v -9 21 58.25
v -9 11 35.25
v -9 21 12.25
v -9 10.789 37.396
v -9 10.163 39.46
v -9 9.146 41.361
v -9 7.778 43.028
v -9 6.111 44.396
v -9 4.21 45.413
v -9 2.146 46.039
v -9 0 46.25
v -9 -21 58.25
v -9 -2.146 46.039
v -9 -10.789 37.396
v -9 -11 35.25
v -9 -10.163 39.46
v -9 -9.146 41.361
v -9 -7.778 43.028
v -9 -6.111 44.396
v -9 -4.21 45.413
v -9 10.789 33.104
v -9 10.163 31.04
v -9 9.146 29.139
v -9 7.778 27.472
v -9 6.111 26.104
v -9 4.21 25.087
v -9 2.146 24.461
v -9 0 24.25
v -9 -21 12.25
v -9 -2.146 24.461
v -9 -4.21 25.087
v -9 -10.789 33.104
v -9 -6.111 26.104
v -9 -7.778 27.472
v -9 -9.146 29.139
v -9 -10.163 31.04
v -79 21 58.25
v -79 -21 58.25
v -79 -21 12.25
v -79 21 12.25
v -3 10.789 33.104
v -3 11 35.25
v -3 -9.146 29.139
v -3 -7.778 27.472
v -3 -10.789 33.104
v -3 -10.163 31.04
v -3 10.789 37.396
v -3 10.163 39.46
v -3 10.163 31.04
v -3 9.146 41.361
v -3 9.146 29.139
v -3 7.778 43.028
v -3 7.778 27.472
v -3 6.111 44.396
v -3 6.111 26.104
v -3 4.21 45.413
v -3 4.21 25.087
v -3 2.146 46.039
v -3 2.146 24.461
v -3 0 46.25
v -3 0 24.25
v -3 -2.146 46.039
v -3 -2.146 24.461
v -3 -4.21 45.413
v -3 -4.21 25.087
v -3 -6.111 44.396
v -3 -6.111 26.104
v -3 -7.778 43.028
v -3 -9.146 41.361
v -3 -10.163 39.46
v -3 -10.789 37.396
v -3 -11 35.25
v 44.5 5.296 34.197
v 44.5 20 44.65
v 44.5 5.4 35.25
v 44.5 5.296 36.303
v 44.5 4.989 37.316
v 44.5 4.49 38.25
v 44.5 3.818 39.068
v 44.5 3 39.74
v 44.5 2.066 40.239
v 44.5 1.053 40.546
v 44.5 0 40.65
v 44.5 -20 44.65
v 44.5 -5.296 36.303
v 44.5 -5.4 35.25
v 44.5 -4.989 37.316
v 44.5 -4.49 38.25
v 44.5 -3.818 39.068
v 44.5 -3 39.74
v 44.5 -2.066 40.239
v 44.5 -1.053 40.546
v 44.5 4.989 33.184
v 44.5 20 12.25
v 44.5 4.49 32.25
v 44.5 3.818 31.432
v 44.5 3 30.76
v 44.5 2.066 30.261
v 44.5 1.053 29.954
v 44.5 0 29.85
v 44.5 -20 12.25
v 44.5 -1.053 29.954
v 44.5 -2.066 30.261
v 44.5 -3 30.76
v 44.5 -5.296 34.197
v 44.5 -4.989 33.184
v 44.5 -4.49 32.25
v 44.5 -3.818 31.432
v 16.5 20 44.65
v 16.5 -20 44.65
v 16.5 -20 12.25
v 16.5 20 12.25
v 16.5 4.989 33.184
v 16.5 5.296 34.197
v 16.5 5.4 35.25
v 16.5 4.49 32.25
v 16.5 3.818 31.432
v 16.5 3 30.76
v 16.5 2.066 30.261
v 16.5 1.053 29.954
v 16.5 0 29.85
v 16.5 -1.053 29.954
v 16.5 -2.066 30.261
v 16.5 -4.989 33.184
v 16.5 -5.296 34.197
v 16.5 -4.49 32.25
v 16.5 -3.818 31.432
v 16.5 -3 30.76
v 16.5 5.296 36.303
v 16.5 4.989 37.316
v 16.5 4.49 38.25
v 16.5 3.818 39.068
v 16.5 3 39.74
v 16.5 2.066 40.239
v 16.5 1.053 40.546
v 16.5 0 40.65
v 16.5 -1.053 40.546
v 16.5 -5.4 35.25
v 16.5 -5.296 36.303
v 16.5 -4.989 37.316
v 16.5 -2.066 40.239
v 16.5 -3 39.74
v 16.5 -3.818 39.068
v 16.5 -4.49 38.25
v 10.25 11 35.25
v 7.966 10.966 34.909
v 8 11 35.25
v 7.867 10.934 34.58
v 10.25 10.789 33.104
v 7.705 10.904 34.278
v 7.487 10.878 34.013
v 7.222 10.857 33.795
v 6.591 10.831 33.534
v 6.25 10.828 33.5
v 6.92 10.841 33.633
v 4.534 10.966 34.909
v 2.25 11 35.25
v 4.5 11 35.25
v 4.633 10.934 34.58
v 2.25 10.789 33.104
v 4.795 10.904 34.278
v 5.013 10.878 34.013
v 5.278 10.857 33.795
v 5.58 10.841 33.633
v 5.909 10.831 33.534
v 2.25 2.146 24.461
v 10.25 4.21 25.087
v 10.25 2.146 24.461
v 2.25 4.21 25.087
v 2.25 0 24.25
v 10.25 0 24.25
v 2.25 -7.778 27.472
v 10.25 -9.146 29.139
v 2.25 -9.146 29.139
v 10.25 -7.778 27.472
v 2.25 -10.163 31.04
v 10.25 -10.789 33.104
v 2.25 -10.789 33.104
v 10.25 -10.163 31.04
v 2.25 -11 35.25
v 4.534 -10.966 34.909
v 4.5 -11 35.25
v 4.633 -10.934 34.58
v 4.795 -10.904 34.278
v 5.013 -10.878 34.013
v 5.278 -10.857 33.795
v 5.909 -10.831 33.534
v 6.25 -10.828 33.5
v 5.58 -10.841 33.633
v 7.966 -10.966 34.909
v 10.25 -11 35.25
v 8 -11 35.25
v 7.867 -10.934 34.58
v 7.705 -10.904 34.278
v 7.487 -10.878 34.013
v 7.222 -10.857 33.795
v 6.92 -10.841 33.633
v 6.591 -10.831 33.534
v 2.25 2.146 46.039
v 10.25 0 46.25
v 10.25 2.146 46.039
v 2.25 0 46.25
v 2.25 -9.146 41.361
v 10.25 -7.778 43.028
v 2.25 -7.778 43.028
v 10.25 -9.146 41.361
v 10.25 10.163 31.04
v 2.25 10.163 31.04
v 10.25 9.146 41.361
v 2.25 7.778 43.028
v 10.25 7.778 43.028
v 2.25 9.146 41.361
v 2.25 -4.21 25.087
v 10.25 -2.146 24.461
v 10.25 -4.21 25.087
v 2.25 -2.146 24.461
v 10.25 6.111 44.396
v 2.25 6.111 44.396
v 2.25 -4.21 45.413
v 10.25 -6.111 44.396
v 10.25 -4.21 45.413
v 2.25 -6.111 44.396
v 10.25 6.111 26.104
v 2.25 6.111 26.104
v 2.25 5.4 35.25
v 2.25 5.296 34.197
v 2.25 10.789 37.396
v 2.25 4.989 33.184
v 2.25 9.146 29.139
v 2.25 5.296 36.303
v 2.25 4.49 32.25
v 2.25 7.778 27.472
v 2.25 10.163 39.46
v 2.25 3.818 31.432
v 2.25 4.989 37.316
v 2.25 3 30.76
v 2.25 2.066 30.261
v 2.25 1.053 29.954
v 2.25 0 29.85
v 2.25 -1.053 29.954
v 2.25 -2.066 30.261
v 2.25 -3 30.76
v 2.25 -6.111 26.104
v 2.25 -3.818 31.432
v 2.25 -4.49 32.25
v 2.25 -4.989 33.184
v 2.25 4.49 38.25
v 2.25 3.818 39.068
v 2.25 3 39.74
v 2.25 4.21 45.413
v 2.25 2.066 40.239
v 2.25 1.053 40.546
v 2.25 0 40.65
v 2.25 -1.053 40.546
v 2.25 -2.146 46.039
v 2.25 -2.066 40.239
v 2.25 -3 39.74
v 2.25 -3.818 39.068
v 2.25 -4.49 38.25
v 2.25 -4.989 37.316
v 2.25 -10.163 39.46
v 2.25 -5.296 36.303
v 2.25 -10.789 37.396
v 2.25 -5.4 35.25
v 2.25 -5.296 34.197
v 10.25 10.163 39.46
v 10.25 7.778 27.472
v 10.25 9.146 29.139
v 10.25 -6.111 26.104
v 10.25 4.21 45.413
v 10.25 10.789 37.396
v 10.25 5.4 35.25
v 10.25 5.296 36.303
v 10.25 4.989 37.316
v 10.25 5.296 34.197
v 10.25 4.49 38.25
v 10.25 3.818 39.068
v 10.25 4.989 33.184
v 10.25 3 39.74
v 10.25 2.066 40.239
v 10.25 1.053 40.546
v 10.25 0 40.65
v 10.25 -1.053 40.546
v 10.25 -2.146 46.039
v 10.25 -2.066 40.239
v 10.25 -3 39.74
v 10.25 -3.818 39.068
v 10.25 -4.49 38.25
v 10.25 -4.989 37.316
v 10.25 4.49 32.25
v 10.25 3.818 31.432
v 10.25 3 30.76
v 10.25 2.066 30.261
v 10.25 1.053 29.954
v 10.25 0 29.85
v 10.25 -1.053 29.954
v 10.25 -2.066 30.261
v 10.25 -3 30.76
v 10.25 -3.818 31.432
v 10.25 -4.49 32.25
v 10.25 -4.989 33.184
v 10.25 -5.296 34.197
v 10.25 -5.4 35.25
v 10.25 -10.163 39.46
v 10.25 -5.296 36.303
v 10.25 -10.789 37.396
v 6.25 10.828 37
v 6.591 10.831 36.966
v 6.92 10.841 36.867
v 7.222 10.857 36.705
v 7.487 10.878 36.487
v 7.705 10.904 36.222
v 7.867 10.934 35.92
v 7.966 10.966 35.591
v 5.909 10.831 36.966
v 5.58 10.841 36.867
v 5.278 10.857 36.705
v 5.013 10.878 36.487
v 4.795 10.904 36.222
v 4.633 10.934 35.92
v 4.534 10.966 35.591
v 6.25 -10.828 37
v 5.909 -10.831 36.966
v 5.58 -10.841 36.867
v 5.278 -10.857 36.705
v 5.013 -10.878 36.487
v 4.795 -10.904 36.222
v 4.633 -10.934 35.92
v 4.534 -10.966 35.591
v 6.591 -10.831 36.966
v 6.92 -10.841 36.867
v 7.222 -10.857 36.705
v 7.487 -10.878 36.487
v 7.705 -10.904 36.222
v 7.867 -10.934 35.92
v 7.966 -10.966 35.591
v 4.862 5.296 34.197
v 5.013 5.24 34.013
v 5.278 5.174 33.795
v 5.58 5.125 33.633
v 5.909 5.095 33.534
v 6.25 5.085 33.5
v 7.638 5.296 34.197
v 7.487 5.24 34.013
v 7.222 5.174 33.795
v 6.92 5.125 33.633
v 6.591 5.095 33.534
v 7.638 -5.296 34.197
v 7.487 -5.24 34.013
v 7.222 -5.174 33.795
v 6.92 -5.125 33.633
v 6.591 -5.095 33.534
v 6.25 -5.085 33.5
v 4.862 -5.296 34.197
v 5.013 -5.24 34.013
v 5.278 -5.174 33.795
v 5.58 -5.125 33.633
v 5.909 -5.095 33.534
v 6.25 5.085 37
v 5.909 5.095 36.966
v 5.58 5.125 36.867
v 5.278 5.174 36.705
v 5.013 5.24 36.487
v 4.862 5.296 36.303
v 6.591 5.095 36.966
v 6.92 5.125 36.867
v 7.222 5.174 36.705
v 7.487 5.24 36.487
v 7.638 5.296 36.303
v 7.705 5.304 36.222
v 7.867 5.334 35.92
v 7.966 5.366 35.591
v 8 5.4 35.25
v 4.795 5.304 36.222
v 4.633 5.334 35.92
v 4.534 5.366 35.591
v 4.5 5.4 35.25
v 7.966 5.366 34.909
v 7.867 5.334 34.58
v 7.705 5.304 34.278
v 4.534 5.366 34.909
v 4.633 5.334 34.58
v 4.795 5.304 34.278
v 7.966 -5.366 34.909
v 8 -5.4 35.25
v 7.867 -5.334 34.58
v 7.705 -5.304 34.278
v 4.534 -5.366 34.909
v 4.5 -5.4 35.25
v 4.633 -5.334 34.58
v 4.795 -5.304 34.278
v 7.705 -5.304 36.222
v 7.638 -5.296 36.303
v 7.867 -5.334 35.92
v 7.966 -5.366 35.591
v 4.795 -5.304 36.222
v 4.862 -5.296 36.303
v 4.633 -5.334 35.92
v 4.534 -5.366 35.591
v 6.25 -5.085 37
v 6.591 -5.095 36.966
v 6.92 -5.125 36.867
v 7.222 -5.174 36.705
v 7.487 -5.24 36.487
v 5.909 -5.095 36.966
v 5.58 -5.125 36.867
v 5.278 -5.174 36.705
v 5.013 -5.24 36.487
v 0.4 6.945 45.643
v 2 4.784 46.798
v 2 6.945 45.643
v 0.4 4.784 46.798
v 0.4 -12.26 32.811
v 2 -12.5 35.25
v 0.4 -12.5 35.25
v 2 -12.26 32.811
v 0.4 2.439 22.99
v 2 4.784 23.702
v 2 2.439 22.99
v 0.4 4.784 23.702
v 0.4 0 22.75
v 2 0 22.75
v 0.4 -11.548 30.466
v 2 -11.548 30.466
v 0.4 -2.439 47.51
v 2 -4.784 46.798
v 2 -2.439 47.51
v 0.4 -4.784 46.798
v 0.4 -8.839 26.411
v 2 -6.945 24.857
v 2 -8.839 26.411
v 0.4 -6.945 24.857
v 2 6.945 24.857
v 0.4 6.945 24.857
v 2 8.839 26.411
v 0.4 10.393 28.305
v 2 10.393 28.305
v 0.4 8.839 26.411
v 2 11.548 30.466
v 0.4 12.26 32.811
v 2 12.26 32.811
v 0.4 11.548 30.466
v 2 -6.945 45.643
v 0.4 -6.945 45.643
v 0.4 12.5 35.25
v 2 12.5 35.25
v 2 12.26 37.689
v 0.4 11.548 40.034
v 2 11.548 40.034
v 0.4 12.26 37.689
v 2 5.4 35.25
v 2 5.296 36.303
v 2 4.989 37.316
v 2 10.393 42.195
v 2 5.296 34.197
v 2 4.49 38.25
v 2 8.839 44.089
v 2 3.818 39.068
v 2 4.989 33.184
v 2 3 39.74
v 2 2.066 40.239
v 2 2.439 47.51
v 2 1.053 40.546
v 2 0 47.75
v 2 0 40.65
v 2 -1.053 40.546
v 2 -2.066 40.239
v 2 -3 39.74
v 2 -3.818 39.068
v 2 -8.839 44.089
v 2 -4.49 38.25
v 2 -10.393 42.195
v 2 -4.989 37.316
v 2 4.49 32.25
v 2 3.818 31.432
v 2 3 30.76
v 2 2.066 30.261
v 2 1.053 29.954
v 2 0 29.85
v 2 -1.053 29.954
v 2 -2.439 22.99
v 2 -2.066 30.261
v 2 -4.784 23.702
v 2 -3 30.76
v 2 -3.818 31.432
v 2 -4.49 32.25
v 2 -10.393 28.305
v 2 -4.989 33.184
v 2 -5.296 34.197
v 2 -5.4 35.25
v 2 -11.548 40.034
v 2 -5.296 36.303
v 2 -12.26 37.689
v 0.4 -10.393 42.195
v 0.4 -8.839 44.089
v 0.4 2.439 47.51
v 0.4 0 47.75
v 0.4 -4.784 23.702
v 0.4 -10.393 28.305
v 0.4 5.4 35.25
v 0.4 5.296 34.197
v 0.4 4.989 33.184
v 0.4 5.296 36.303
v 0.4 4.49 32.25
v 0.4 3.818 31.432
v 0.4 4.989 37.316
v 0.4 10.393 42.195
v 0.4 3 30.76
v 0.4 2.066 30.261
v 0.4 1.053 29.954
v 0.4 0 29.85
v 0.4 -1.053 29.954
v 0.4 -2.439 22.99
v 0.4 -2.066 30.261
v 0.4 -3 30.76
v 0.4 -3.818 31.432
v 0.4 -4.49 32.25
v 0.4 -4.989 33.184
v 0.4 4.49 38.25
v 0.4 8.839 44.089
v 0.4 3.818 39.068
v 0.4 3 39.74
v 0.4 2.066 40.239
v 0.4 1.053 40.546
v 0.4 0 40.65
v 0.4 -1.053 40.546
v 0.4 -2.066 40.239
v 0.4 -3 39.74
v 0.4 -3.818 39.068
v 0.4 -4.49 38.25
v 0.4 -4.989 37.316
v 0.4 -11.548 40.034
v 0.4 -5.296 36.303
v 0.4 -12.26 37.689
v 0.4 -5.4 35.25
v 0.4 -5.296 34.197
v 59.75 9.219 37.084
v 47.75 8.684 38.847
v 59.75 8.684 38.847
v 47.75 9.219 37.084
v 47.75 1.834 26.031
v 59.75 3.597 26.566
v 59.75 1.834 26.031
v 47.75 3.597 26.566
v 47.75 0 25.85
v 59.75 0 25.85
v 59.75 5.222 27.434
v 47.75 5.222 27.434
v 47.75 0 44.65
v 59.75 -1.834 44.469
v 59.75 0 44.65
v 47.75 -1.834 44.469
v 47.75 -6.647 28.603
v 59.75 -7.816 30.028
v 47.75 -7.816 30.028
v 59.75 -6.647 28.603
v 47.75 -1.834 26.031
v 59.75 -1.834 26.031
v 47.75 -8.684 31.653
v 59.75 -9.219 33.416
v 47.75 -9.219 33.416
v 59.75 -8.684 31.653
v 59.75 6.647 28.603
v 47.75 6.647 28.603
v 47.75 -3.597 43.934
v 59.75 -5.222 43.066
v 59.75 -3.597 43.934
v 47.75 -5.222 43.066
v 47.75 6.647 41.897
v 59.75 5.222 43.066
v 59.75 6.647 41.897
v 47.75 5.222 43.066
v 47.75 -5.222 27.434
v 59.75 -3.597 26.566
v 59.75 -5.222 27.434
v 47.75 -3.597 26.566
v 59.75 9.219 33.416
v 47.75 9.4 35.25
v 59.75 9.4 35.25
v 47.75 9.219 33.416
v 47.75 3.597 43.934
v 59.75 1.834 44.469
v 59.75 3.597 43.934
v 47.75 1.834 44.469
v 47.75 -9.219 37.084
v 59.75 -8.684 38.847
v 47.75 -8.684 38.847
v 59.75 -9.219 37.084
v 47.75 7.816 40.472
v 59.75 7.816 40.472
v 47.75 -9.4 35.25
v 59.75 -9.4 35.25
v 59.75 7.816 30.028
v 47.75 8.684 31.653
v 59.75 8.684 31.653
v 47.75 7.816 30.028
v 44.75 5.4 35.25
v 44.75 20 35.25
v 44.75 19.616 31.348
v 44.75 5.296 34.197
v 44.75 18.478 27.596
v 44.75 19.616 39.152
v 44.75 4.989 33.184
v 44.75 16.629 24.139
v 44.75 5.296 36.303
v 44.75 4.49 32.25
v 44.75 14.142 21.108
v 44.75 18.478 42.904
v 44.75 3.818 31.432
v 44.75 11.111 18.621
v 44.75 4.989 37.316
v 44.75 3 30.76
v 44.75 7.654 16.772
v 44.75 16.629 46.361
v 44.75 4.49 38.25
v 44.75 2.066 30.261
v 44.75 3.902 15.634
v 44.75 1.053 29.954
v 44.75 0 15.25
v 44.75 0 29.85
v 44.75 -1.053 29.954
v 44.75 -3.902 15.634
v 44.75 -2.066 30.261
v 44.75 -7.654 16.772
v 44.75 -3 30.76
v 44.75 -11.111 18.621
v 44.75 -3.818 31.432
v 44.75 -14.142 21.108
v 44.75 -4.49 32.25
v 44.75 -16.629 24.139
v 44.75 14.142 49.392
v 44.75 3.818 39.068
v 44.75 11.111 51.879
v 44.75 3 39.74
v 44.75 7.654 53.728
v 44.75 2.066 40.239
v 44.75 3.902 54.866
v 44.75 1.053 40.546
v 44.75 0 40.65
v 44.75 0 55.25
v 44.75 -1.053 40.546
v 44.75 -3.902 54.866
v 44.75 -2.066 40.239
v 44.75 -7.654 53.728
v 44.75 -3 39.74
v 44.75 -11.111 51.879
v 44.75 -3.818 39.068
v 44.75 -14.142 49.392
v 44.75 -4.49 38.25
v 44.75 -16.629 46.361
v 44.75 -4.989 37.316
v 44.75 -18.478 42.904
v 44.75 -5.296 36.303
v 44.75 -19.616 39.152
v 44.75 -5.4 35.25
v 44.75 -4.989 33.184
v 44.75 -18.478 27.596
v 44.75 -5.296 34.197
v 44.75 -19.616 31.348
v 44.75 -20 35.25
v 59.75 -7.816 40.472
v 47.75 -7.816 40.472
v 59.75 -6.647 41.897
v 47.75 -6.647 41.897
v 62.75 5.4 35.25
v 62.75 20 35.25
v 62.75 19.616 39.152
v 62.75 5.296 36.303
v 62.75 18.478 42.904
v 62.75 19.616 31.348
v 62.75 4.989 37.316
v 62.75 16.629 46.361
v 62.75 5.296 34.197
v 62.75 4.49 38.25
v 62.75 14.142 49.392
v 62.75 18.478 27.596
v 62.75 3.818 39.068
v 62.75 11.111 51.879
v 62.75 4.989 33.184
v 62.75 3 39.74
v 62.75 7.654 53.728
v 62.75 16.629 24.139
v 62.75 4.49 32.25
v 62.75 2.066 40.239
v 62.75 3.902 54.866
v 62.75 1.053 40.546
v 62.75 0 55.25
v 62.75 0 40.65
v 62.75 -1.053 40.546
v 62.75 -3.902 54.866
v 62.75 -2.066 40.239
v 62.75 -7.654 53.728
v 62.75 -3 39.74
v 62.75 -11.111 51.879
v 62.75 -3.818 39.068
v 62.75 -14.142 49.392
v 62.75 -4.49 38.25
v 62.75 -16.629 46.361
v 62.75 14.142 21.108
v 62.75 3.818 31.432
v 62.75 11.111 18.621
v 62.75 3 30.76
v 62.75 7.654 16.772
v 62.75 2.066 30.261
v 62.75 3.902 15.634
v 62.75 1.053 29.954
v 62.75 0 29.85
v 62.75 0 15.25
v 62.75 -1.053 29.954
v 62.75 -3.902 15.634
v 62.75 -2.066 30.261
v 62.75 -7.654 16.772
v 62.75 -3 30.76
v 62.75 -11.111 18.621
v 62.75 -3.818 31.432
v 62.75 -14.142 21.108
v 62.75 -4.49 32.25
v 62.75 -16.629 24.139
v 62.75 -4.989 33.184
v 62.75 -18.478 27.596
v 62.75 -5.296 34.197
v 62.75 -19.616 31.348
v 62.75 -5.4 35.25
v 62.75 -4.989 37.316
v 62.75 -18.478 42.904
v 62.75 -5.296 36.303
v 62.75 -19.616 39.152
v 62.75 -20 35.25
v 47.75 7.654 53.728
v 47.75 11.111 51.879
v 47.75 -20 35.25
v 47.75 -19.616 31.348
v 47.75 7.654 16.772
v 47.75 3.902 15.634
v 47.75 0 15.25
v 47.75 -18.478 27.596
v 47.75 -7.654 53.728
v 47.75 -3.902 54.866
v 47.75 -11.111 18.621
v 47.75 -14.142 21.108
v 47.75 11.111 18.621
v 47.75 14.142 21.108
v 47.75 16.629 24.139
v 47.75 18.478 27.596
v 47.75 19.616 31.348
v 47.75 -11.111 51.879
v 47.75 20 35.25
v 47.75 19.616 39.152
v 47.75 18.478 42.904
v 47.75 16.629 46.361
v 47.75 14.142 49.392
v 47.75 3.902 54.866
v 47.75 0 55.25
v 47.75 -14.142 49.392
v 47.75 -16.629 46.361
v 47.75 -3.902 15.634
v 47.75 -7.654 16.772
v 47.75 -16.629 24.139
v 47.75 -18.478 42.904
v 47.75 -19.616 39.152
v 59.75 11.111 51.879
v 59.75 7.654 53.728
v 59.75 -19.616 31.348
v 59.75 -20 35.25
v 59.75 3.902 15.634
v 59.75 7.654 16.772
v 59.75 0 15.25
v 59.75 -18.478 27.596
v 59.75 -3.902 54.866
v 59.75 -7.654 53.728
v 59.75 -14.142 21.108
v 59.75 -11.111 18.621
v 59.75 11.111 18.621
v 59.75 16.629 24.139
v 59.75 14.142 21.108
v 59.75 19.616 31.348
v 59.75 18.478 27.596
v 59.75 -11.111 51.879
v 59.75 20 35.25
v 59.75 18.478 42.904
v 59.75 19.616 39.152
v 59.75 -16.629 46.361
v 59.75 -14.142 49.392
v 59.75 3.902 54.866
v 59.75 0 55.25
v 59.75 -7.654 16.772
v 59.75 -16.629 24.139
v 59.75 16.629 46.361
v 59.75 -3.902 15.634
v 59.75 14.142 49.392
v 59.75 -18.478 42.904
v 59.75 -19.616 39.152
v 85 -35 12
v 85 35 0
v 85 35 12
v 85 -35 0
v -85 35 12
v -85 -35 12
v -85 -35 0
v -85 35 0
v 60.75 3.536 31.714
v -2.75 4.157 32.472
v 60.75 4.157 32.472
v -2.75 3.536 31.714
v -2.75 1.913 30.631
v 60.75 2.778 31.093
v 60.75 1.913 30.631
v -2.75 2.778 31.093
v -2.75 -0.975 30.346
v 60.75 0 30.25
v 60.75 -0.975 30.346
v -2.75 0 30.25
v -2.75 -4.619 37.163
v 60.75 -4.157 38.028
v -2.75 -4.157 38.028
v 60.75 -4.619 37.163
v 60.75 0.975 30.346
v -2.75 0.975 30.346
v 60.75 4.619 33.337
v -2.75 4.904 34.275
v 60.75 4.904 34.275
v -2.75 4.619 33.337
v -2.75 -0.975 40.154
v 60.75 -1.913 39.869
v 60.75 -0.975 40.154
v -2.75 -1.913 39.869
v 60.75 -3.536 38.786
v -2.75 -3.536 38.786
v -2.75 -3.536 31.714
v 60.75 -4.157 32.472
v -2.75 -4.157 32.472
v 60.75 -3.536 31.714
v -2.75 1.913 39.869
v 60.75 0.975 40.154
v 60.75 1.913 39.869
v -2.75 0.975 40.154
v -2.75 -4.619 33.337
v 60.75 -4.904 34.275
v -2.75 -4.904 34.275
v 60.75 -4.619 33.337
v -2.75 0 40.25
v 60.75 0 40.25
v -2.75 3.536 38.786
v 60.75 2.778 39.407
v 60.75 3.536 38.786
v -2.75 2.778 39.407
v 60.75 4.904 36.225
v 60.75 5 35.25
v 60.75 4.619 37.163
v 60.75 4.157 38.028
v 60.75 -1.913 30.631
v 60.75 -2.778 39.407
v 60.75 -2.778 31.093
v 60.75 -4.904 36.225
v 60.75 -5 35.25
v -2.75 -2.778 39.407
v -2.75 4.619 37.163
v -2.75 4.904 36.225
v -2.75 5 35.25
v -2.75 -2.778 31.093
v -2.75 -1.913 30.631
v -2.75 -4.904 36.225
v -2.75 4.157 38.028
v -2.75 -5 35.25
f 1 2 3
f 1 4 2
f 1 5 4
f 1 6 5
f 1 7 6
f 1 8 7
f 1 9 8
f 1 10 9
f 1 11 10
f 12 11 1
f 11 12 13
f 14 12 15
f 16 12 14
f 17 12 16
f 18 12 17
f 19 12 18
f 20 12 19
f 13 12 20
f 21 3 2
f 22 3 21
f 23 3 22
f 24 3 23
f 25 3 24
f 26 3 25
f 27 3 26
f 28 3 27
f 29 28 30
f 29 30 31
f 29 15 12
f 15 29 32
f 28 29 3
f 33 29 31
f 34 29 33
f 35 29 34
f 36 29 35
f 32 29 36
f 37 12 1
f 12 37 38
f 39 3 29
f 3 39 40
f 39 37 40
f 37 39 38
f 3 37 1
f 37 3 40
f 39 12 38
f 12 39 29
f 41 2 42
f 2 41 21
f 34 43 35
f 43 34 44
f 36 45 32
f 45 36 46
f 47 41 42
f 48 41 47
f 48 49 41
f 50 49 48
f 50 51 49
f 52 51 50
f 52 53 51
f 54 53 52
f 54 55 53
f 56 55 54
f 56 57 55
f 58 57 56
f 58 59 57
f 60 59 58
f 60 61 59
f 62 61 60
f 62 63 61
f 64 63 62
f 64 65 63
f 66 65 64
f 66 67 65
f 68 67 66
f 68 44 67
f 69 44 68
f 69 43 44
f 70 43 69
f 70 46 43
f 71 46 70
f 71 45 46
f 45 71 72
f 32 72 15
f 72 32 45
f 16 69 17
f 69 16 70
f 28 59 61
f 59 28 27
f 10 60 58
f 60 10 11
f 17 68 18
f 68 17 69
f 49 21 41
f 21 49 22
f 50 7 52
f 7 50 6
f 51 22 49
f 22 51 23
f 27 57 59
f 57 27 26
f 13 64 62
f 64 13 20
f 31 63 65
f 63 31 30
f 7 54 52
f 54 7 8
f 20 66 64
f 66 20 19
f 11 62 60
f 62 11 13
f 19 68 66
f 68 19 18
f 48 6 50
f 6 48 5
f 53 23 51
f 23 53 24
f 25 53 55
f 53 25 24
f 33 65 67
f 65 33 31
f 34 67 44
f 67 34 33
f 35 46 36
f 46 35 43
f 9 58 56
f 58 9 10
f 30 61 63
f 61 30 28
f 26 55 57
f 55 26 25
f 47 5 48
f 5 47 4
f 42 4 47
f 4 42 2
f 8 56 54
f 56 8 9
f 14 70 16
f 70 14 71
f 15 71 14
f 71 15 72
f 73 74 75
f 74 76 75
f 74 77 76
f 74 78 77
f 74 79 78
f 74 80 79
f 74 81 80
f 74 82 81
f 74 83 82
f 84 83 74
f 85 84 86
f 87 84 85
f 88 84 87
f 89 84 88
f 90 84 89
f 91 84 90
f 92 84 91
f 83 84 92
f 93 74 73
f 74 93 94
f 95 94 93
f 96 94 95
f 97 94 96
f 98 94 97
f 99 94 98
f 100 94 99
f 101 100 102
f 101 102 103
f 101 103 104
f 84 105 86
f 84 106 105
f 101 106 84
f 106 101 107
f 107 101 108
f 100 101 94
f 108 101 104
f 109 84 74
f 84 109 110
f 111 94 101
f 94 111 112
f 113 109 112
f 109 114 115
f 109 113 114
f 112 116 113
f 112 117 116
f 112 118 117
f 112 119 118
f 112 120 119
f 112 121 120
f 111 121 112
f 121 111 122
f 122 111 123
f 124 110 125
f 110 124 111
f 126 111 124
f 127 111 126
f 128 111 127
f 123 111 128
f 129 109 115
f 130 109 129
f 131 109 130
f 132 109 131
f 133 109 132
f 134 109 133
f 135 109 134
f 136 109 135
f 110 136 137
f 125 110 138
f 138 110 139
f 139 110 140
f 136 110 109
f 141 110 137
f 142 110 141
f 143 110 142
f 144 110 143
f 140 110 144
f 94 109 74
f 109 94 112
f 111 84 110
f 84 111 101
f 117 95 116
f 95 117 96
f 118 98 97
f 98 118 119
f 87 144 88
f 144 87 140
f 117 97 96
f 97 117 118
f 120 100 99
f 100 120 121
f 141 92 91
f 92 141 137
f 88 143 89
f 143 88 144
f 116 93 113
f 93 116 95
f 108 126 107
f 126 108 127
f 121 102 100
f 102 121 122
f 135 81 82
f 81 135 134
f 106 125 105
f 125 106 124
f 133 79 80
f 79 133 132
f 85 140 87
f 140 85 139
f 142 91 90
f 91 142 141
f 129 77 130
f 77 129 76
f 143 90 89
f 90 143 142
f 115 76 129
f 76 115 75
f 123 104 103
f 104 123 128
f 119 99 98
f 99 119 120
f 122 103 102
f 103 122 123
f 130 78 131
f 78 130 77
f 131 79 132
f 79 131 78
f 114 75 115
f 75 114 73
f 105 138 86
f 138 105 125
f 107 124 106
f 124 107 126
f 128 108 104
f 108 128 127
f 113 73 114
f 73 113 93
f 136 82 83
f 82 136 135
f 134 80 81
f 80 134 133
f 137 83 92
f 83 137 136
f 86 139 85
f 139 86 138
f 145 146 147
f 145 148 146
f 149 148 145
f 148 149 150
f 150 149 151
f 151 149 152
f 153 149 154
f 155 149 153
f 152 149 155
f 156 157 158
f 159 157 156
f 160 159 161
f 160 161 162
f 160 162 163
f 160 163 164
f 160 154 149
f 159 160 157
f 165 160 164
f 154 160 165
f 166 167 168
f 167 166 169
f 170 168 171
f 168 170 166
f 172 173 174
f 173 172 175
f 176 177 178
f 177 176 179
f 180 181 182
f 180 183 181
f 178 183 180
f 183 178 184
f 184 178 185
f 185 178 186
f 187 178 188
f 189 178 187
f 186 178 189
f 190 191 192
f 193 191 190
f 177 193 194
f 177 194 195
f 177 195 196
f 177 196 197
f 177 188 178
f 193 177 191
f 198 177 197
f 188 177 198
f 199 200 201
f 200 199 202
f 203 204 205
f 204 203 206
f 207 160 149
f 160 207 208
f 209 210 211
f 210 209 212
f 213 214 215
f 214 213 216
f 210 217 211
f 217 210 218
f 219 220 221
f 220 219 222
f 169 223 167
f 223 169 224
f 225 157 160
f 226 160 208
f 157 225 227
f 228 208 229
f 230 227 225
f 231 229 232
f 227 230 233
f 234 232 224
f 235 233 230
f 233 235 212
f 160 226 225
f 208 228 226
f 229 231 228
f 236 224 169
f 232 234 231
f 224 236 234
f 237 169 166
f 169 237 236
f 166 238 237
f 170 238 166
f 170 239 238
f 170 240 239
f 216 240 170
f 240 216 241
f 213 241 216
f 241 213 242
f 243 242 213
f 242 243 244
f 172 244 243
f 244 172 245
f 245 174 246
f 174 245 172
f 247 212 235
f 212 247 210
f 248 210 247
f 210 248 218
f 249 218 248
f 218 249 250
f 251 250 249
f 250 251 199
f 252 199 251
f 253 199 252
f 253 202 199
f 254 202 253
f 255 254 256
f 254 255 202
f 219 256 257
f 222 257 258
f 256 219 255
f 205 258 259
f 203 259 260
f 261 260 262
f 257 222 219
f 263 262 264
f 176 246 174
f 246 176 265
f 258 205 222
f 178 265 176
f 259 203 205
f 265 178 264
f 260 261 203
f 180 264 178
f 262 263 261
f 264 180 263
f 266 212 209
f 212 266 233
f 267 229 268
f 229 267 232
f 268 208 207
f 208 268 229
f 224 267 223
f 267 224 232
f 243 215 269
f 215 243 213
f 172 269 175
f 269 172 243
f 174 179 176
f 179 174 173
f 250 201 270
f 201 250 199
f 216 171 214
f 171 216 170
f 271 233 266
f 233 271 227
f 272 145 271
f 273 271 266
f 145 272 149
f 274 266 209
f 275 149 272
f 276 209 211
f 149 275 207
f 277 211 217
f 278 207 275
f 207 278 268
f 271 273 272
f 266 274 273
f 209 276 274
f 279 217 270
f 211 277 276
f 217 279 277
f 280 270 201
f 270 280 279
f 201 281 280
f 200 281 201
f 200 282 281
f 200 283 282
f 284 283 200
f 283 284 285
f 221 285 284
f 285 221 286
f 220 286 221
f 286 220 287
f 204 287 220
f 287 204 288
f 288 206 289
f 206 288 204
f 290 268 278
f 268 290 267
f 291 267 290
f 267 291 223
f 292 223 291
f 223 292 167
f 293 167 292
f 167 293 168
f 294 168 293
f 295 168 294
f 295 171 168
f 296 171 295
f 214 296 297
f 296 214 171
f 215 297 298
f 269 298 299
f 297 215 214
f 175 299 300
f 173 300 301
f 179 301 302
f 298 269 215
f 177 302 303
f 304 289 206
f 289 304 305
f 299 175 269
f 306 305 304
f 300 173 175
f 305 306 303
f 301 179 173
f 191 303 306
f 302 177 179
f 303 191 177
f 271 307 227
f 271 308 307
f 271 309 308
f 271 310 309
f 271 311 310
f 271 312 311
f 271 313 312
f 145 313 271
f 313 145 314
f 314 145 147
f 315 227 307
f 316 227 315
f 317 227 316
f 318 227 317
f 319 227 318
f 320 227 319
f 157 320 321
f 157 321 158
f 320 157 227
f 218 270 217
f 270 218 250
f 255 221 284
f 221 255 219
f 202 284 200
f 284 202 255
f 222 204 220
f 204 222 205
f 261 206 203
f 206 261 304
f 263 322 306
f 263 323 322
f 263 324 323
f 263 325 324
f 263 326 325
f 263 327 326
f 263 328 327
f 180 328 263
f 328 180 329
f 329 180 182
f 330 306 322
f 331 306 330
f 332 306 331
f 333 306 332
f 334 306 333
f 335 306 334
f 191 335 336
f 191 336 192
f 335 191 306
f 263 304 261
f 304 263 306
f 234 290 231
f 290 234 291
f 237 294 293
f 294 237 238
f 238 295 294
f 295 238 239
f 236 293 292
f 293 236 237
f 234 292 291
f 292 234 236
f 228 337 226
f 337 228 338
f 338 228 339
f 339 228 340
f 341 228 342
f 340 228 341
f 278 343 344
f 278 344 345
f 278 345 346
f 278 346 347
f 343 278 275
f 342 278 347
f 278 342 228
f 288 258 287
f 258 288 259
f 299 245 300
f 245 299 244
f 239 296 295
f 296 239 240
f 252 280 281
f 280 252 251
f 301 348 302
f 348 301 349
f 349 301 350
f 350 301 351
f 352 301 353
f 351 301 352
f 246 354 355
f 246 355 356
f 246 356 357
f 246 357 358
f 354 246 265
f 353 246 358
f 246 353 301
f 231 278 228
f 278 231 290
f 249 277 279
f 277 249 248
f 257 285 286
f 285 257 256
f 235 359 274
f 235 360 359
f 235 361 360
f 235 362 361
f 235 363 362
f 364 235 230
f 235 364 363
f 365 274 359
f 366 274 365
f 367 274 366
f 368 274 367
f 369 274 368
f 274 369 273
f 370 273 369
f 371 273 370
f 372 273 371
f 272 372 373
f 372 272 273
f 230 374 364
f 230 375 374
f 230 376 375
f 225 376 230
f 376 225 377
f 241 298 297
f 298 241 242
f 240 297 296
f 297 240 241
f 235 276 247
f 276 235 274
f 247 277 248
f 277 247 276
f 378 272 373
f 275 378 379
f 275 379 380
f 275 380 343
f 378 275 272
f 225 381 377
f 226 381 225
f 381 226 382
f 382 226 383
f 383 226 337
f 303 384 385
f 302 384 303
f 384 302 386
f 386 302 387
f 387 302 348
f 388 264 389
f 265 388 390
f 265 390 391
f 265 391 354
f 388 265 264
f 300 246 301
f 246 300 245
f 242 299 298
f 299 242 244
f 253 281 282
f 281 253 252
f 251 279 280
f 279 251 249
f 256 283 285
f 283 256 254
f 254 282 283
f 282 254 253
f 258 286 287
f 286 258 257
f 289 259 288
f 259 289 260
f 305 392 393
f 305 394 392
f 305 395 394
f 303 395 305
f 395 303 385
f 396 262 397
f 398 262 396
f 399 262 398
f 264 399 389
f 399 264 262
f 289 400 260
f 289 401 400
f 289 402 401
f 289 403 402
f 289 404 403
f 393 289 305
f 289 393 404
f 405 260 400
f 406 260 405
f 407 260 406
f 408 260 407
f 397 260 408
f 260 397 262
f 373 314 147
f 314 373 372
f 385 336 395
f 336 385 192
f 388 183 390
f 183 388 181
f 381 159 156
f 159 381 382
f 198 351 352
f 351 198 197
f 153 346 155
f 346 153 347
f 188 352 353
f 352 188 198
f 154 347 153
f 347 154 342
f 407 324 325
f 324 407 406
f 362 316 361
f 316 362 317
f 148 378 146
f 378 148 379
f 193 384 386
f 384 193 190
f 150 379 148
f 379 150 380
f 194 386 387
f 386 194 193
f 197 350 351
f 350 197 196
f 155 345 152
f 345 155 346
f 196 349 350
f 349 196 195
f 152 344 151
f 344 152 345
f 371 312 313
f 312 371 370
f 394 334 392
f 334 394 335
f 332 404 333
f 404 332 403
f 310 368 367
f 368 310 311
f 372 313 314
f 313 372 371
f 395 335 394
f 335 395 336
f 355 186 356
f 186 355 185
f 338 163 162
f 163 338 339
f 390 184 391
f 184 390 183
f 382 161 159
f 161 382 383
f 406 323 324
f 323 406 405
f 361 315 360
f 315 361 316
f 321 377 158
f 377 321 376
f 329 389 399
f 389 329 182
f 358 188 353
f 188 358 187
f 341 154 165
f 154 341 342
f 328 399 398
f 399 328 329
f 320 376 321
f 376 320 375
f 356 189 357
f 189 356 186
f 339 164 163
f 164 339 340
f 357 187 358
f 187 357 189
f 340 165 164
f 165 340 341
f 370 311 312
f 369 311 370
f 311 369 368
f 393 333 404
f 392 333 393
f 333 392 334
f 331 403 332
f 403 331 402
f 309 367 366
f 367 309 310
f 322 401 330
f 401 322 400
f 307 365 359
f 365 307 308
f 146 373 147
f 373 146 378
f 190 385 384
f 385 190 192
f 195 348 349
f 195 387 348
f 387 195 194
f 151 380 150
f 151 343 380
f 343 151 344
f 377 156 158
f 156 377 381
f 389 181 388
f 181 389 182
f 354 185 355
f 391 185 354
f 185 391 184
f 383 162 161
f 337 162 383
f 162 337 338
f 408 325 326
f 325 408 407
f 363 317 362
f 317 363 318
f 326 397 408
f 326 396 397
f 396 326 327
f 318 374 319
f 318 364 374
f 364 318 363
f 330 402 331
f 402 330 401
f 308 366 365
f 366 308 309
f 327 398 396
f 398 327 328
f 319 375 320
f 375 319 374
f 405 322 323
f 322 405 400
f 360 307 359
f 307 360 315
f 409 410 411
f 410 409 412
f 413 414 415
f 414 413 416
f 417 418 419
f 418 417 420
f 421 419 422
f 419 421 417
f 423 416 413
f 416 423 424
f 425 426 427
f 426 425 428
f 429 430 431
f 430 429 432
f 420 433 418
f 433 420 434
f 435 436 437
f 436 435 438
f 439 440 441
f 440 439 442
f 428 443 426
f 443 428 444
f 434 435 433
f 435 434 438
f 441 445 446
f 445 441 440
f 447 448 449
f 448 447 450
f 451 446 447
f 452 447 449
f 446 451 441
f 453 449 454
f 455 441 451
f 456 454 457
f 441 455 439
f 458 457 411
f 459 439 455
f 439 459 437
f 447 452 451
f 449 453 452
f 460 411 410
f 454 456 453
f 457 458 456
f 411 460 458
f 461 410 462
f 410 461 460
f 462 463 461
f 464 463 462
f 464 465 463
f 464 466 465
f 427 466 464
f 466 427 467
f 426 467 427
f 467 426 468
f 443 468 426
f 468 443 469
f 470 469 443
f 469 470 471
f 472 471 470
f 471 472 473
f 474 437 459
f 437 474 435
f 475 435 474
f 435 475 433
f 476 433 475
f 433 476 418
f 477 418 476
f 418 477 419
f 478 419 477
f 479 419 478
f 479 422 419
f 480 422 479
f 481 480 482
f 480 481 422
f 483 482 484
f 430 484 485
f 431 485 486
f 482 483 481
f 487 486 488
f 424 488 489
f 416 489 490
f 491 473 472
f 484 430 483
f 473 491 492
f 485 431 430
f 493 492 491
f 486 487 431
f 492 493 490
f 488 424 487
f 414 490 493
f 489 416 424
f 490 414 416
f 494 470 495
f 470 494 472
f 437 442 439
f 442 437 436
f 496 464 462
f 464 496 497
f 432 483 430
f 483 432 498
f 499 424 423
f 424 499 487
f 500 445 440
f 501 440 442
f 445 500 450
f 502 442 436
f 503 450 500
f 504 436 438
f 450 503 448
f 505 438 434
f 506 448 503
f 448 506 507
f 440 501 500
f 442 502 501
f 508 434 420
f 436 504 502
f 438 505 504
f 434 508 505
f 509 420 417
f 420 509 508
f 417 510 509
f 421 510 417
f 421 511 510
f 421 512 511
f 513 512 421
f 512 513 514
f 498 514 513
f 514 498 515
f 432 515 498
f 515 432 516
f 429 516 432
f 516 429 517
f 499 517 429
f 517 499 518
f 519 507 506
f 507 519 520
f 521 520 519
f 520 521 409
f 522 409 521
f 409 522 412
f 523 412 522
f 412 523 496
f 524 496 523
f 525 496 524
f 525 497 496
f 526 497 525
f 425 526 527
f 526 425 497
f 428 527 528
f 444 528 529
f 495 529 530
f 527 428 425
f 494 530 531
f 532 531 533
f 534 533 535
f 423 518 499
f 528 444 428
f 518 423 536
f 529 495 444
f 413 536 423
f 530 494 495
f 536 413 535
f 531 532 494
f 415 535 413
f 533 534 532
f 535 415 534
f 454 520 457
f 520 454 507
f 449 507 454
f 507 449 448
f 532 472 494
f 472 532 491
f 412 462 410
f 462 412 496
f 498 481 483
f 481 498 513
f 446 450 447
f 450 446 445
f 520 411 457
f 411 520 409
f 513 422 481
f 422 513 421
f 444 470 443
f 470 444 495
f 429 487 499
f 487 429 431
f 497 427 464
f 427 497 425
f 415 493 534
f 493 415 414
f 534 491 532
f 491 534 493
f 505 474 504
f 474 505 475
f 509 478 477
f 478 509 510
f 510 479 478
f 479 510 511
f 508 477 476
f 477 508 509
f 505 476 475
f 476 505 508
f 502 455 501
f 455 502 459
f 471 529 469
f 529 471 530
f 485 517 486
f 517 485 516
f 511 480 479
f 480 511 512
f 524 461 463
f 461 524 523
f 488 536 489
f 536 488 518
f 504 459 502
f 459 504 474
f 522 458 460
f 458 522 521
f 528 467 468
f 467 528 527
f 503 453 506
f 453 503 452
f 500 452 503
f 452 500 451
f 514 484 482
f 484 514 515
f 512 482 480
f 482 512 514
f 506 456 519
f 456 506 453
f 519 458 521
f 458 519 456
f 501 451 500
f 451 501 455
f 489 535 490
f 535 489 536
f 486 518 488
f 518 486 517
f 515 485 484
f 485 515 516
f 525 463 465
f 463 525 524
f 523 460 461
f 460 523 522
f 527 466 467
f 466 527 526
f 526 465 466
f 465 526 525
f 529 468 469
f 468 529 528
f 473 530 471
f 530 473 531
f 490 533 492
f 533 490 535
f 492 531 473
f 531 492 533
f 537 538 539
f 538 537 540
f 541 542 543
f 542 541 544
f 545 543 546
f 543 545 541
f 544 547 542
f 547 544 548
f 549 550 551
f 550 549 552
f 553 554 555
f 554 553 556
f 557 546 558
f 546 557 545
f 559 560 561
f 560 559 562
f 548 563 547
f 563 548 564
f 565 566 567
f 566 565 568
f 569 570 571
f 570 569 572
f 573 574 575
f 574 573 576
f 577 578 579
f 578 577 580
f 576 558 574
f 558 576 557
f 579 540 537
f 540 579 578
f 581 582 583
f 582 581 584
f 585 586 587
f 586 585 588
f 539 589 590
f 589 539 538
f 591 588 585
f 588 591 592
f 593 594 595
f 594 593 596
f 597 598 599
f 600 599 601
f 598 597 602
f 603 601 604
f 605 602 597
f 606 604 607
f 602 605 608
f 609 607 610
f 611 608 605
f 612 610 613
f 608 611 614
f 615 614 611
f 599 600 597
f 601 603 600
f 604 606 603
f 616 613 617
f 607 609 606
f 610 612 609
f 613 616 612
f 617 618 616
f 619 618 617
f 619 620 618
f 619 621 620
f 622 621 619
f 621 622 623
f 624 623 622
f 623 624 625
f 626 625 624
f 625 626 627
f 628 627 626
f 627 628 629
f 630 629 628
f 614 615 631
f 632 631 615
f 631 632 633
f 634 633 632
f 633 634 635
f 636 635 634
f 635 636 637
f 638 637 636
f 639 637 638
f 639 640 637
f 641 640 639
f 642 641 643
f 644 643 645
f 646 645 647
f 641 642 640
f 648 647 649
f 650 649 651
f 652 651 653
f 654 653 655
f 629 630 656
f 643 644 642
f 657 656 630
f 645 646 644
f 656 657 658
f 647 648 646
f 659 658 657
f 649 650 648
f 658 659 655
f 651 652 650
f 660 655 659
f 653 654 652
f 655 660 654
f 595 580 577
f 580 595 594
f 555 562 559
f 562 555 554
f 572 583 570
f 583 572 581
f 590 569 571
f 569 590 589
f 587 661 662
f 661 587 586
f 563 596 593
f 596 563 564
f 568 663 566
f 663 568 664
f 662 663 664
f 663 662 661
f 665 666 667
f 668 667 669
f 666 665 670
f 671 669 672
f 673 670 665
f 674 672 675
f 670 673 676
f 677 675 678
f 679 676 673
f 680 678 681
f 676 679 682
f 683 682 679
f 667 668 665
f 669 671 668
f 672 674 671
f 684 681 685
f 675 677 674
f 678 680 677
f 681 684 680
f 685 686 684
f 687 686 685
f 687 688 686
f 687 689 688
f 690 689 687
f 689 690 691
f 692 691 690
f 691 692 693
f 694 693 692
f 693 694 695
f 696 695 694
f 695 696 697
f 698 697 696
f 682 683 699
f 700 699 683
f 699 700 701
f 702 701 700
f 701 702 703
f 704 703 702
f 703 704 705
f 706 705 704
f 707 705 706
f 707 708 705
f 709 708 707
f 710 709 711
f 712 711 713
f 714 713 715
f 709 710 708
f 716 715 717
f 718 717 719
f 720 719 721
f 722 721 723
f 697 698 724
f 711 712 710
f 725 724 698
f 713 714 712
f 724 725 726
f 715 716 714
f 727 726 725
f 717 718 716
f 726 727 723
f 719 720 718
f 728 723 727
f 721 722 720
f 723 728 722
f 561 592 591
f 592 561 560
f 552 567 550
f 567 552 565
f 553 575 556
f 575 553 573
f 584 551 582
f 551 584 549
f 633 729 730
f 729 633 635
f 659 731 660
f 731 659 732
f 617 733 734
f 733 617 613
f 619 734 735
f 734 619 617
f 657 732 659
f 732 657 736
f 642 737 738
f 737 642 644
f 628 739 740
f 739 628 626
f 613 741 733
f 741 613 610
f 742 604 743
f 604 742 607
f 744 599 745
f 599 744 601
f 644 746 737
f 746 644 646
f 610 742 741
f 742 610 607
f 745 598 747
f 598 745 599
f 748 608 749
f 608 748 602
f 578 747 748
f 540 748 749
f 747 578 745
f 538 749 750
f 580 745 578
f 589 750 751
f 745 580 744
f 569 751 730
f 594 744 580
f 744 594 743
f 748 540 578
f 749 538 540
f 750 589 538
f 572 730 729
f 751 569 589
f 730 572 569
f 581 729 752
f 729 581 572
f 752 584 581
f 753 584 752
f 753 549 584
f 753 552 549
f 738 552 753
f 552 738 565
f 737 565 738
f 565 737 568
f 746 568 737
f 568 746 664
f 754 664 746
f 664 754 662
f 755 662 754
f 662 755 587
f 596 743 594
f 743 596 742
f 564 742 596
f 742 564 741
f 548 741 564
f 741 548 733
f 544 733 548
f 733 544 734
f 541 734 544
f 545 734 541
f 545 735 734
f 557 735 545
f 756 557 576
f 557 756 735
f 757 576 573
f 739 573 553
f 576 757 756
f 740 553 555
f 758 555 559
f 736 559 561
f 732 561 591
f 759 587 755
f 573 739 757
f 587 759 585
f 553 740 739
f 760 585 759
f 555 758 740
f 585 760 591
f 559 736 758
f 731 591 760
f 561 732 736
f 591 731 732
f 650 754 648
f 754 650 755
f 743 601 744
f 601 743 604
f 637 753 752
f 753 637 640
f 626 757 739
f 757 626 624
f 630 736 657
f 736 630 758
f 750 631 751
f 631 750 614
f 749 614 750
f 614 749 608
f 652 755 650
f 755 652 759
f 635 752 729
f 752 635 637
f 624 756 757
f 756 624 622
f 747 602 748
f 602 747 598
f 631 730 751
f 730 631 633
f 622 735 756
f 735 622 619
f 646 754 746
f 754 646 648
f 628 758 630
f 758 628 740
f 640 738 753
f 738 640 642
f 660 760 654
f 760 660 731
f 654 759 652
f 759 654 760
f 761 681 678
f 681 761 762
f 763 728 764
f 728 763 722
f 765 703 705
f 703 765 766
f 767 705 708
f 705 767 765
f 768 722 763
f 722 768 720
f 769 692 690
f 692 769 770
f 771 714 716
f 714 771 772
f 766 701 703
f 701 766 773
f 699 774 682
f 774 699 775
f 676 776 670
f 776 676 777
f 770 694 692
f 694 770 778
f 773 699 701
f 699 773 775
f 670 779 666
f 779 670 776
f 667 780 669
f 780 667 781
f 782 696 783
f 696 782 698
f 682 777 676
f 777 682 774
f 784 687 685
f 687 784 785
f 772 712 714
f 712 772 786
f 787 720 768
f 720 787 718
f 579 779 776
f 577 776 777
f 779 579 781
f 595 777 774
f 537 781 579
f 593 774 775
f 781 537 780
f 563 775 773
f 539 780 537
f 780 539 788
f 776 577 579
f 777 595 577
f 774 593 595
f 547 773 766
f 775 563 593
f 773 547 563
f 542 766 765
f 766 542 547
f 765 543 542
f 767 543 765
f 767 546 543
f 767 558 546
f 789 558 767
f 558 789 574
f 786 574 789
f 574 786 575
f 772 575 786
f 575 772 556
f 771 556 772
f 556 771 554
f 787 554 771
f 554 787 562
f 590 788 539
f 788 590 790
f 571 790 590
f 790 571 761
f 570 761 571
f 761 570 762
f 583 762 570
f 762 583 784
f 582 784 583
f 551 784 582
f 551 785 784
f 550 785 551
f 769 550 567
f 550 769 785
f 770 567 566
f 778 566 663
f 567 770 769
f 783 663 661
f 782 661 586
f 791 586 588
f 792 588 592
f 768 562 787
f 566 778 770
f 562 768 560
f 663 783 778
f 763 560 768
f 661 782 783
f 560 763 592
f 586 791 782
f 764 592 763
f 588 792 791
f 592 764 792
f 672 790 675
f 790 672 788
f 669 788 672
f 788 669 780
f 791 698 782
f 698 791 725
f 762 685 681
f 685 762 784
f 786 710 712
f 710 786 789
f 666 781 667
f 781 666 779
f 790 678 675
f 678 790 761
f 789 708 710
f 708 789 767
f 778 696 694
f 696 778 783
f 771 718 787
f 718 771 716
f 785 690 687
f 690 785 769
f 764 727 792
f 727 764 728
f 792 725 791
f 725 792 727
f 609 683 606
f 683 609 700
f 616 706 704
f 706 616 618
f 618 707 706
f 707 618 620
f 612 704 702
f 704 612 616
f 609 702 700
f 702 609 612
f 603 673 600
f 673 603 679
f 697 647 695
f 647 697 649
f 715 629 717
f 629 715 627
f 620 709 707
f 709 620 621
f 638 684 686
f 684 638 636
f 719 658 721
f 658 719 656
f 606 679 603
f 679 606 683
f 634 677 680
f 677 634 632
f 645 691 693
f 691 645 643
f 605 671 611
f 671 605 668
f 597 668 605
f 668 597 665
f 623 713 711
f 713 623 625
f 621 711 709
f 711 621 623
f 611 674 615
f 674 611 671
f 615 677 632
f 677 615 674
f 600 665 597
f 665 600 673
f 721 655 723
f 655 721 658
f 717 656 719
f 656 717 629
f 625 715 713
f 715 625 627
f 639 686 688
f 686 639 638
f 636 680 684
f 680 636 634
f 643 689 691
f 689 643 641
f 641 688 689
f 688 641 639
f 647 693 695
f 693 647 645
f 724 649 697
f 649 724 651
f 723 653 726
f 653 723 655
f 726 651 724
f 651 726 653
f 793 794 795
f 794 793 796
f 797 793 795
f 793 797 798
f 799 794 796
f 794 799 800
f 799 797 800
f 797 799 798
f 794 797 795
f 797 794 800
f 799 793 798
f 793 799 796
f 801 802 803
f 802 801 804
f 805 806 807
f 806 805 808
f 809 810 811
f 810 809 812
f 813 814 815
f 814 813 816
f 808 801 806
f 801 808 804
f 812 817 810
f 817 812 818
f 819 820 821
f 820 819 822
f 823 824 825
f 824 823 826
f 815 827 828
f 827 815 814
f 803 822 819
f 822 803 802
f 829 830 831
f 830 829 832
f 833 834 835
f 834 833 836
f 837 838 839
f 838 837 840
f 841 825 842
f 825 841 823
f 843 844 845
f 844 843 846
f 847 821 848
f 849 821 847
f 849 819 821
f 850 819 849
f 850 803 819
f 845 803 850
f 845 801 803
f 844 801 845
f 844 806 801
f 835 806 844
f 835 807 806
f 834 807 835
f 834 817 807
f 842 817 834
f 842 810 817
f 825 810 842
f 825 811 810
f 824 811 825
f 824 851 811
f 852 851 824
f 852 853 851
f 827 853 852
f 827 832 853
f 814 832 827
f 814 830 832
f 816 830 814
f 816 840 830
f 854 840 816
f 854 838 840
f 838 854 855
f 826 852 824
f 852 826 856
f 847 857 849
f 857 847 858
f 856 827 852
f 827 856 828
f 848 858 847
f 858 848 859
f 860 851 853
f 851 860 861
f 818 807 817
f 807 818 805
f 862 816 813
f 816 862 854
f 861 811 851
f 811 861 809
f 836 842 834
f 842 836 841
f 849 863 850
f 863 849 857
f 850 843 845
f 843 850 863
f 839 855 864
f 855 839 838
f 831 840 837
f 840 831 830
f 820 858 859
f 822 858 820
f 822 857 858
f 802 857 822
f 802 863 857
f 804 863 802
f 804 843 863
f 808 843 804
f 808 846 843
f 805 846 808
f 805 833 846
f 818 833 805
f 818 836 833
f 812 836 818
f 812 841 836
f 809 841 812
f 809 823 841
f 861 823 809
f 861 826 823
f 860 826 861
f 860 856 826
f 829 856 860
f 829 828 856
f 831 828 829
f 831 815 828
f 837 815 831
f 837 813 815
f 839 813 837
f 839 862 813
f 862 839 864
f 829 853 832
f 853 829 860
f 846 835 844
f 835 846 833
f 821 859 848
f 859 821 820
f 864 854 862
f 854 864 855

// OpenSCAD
$fn = 32;

// ------------------------------------------------------------------------
// Motor drive station: motor 70 x 46 mm, shaft d10, pulley d40
// Every part is its own module, assembly() places every instance.
// ------------------------------------------------------------------------

// --- part 1 ---
module station_bed() {
  difference() {
    translate([-85, -35, 0]) cube([170, 70, 12]);
  }
}

// --- part 2 ---
module drive_motor() {
  union() {
    translate([-35, -21, 0]) cube([70, 42, 46]);
    translate([38, 0, 23]) rotate([0, 90, 0]) cylinder(h = 6, d = 22, center = true);
  }
}

// --- part 3 ---
module pillow_block() {
  difference() {
    translate([-14, -20, 0]) cube([28, 40, 32.4]);
    translate([0, 0, 23]) rotate([0, 90, 0]) cylinder(h = 30, d = 10.8, center = true);
  }
}

// --- part 4 ---
module drive_shaft() {
  translate([0, 0, -31.75]) cylinder(h = 63.5, d = 10);
}

// --- part 5 ---
module shaft_collar() {
  difference() {
    cylinder(h = 8, d = 22);
    translate([0, 0, -1]) cylinder(h = 10, d = 10.8);
    translate([0, 0, 4]) rotate([90, 0, 0]) cylinder(h = 24, d = 3.5, center = true);
  }
}

// --- part 6 ---
module collar_washer() {
  difference() {
      translate([0, 0, 0]) cylinder(h = 1.6, d = 25);
      translate([0, 0, -1]) cylinder(h = 3.6, d = 10.8);
    }
}

// --- part 7 ---
module drive_pulley() {
  difference() {
    union() {
      cylinder(h = 18, d = 18.8);
      cylinder(h = 3, d = 40);
      translate([0, 0, 15]) cylinder(h = 3, d = 40);
    }
    translate([0, 0, -1]) cylinder(h = 20, d = 10.8);
  }
}

// --- assembly ---
module assembly() {
  color([0.80, 0.24, 0.20]) translate([0, 0, 0]) rotate([0, 0, 0]) station_bed();
  color([0.20, 0.45, 0.75]) translate([-44, 0, 12.25]) rotate([0, 0, 0]) drive_motor();
  color([0.25, 0.62, 0.32]) translate([30.5, 0, 12.25]) rotate([0, 0, 0]) pillow_block();
  color([0.92, 0.70, 0.18]) translate([29, 0, 35.25]) rotate([0, 90, 0]) drive_shaft();
  color([0.58, 0.35, 0.70]) translate([2.25, 0, 35.25]) rotate([0, 90, 0]) shaft_collar();
  color([0.16, 0.66, 0.66]) translate([0.4, 0, 35.25]) rotate([0, 90, 0]) collar_washer();
  color([0.85, 0.48, 0.18]) translate([44.75, 0, 35.25]) rotate([0, 90, 0]) drive_pulley();
}

assembly();
